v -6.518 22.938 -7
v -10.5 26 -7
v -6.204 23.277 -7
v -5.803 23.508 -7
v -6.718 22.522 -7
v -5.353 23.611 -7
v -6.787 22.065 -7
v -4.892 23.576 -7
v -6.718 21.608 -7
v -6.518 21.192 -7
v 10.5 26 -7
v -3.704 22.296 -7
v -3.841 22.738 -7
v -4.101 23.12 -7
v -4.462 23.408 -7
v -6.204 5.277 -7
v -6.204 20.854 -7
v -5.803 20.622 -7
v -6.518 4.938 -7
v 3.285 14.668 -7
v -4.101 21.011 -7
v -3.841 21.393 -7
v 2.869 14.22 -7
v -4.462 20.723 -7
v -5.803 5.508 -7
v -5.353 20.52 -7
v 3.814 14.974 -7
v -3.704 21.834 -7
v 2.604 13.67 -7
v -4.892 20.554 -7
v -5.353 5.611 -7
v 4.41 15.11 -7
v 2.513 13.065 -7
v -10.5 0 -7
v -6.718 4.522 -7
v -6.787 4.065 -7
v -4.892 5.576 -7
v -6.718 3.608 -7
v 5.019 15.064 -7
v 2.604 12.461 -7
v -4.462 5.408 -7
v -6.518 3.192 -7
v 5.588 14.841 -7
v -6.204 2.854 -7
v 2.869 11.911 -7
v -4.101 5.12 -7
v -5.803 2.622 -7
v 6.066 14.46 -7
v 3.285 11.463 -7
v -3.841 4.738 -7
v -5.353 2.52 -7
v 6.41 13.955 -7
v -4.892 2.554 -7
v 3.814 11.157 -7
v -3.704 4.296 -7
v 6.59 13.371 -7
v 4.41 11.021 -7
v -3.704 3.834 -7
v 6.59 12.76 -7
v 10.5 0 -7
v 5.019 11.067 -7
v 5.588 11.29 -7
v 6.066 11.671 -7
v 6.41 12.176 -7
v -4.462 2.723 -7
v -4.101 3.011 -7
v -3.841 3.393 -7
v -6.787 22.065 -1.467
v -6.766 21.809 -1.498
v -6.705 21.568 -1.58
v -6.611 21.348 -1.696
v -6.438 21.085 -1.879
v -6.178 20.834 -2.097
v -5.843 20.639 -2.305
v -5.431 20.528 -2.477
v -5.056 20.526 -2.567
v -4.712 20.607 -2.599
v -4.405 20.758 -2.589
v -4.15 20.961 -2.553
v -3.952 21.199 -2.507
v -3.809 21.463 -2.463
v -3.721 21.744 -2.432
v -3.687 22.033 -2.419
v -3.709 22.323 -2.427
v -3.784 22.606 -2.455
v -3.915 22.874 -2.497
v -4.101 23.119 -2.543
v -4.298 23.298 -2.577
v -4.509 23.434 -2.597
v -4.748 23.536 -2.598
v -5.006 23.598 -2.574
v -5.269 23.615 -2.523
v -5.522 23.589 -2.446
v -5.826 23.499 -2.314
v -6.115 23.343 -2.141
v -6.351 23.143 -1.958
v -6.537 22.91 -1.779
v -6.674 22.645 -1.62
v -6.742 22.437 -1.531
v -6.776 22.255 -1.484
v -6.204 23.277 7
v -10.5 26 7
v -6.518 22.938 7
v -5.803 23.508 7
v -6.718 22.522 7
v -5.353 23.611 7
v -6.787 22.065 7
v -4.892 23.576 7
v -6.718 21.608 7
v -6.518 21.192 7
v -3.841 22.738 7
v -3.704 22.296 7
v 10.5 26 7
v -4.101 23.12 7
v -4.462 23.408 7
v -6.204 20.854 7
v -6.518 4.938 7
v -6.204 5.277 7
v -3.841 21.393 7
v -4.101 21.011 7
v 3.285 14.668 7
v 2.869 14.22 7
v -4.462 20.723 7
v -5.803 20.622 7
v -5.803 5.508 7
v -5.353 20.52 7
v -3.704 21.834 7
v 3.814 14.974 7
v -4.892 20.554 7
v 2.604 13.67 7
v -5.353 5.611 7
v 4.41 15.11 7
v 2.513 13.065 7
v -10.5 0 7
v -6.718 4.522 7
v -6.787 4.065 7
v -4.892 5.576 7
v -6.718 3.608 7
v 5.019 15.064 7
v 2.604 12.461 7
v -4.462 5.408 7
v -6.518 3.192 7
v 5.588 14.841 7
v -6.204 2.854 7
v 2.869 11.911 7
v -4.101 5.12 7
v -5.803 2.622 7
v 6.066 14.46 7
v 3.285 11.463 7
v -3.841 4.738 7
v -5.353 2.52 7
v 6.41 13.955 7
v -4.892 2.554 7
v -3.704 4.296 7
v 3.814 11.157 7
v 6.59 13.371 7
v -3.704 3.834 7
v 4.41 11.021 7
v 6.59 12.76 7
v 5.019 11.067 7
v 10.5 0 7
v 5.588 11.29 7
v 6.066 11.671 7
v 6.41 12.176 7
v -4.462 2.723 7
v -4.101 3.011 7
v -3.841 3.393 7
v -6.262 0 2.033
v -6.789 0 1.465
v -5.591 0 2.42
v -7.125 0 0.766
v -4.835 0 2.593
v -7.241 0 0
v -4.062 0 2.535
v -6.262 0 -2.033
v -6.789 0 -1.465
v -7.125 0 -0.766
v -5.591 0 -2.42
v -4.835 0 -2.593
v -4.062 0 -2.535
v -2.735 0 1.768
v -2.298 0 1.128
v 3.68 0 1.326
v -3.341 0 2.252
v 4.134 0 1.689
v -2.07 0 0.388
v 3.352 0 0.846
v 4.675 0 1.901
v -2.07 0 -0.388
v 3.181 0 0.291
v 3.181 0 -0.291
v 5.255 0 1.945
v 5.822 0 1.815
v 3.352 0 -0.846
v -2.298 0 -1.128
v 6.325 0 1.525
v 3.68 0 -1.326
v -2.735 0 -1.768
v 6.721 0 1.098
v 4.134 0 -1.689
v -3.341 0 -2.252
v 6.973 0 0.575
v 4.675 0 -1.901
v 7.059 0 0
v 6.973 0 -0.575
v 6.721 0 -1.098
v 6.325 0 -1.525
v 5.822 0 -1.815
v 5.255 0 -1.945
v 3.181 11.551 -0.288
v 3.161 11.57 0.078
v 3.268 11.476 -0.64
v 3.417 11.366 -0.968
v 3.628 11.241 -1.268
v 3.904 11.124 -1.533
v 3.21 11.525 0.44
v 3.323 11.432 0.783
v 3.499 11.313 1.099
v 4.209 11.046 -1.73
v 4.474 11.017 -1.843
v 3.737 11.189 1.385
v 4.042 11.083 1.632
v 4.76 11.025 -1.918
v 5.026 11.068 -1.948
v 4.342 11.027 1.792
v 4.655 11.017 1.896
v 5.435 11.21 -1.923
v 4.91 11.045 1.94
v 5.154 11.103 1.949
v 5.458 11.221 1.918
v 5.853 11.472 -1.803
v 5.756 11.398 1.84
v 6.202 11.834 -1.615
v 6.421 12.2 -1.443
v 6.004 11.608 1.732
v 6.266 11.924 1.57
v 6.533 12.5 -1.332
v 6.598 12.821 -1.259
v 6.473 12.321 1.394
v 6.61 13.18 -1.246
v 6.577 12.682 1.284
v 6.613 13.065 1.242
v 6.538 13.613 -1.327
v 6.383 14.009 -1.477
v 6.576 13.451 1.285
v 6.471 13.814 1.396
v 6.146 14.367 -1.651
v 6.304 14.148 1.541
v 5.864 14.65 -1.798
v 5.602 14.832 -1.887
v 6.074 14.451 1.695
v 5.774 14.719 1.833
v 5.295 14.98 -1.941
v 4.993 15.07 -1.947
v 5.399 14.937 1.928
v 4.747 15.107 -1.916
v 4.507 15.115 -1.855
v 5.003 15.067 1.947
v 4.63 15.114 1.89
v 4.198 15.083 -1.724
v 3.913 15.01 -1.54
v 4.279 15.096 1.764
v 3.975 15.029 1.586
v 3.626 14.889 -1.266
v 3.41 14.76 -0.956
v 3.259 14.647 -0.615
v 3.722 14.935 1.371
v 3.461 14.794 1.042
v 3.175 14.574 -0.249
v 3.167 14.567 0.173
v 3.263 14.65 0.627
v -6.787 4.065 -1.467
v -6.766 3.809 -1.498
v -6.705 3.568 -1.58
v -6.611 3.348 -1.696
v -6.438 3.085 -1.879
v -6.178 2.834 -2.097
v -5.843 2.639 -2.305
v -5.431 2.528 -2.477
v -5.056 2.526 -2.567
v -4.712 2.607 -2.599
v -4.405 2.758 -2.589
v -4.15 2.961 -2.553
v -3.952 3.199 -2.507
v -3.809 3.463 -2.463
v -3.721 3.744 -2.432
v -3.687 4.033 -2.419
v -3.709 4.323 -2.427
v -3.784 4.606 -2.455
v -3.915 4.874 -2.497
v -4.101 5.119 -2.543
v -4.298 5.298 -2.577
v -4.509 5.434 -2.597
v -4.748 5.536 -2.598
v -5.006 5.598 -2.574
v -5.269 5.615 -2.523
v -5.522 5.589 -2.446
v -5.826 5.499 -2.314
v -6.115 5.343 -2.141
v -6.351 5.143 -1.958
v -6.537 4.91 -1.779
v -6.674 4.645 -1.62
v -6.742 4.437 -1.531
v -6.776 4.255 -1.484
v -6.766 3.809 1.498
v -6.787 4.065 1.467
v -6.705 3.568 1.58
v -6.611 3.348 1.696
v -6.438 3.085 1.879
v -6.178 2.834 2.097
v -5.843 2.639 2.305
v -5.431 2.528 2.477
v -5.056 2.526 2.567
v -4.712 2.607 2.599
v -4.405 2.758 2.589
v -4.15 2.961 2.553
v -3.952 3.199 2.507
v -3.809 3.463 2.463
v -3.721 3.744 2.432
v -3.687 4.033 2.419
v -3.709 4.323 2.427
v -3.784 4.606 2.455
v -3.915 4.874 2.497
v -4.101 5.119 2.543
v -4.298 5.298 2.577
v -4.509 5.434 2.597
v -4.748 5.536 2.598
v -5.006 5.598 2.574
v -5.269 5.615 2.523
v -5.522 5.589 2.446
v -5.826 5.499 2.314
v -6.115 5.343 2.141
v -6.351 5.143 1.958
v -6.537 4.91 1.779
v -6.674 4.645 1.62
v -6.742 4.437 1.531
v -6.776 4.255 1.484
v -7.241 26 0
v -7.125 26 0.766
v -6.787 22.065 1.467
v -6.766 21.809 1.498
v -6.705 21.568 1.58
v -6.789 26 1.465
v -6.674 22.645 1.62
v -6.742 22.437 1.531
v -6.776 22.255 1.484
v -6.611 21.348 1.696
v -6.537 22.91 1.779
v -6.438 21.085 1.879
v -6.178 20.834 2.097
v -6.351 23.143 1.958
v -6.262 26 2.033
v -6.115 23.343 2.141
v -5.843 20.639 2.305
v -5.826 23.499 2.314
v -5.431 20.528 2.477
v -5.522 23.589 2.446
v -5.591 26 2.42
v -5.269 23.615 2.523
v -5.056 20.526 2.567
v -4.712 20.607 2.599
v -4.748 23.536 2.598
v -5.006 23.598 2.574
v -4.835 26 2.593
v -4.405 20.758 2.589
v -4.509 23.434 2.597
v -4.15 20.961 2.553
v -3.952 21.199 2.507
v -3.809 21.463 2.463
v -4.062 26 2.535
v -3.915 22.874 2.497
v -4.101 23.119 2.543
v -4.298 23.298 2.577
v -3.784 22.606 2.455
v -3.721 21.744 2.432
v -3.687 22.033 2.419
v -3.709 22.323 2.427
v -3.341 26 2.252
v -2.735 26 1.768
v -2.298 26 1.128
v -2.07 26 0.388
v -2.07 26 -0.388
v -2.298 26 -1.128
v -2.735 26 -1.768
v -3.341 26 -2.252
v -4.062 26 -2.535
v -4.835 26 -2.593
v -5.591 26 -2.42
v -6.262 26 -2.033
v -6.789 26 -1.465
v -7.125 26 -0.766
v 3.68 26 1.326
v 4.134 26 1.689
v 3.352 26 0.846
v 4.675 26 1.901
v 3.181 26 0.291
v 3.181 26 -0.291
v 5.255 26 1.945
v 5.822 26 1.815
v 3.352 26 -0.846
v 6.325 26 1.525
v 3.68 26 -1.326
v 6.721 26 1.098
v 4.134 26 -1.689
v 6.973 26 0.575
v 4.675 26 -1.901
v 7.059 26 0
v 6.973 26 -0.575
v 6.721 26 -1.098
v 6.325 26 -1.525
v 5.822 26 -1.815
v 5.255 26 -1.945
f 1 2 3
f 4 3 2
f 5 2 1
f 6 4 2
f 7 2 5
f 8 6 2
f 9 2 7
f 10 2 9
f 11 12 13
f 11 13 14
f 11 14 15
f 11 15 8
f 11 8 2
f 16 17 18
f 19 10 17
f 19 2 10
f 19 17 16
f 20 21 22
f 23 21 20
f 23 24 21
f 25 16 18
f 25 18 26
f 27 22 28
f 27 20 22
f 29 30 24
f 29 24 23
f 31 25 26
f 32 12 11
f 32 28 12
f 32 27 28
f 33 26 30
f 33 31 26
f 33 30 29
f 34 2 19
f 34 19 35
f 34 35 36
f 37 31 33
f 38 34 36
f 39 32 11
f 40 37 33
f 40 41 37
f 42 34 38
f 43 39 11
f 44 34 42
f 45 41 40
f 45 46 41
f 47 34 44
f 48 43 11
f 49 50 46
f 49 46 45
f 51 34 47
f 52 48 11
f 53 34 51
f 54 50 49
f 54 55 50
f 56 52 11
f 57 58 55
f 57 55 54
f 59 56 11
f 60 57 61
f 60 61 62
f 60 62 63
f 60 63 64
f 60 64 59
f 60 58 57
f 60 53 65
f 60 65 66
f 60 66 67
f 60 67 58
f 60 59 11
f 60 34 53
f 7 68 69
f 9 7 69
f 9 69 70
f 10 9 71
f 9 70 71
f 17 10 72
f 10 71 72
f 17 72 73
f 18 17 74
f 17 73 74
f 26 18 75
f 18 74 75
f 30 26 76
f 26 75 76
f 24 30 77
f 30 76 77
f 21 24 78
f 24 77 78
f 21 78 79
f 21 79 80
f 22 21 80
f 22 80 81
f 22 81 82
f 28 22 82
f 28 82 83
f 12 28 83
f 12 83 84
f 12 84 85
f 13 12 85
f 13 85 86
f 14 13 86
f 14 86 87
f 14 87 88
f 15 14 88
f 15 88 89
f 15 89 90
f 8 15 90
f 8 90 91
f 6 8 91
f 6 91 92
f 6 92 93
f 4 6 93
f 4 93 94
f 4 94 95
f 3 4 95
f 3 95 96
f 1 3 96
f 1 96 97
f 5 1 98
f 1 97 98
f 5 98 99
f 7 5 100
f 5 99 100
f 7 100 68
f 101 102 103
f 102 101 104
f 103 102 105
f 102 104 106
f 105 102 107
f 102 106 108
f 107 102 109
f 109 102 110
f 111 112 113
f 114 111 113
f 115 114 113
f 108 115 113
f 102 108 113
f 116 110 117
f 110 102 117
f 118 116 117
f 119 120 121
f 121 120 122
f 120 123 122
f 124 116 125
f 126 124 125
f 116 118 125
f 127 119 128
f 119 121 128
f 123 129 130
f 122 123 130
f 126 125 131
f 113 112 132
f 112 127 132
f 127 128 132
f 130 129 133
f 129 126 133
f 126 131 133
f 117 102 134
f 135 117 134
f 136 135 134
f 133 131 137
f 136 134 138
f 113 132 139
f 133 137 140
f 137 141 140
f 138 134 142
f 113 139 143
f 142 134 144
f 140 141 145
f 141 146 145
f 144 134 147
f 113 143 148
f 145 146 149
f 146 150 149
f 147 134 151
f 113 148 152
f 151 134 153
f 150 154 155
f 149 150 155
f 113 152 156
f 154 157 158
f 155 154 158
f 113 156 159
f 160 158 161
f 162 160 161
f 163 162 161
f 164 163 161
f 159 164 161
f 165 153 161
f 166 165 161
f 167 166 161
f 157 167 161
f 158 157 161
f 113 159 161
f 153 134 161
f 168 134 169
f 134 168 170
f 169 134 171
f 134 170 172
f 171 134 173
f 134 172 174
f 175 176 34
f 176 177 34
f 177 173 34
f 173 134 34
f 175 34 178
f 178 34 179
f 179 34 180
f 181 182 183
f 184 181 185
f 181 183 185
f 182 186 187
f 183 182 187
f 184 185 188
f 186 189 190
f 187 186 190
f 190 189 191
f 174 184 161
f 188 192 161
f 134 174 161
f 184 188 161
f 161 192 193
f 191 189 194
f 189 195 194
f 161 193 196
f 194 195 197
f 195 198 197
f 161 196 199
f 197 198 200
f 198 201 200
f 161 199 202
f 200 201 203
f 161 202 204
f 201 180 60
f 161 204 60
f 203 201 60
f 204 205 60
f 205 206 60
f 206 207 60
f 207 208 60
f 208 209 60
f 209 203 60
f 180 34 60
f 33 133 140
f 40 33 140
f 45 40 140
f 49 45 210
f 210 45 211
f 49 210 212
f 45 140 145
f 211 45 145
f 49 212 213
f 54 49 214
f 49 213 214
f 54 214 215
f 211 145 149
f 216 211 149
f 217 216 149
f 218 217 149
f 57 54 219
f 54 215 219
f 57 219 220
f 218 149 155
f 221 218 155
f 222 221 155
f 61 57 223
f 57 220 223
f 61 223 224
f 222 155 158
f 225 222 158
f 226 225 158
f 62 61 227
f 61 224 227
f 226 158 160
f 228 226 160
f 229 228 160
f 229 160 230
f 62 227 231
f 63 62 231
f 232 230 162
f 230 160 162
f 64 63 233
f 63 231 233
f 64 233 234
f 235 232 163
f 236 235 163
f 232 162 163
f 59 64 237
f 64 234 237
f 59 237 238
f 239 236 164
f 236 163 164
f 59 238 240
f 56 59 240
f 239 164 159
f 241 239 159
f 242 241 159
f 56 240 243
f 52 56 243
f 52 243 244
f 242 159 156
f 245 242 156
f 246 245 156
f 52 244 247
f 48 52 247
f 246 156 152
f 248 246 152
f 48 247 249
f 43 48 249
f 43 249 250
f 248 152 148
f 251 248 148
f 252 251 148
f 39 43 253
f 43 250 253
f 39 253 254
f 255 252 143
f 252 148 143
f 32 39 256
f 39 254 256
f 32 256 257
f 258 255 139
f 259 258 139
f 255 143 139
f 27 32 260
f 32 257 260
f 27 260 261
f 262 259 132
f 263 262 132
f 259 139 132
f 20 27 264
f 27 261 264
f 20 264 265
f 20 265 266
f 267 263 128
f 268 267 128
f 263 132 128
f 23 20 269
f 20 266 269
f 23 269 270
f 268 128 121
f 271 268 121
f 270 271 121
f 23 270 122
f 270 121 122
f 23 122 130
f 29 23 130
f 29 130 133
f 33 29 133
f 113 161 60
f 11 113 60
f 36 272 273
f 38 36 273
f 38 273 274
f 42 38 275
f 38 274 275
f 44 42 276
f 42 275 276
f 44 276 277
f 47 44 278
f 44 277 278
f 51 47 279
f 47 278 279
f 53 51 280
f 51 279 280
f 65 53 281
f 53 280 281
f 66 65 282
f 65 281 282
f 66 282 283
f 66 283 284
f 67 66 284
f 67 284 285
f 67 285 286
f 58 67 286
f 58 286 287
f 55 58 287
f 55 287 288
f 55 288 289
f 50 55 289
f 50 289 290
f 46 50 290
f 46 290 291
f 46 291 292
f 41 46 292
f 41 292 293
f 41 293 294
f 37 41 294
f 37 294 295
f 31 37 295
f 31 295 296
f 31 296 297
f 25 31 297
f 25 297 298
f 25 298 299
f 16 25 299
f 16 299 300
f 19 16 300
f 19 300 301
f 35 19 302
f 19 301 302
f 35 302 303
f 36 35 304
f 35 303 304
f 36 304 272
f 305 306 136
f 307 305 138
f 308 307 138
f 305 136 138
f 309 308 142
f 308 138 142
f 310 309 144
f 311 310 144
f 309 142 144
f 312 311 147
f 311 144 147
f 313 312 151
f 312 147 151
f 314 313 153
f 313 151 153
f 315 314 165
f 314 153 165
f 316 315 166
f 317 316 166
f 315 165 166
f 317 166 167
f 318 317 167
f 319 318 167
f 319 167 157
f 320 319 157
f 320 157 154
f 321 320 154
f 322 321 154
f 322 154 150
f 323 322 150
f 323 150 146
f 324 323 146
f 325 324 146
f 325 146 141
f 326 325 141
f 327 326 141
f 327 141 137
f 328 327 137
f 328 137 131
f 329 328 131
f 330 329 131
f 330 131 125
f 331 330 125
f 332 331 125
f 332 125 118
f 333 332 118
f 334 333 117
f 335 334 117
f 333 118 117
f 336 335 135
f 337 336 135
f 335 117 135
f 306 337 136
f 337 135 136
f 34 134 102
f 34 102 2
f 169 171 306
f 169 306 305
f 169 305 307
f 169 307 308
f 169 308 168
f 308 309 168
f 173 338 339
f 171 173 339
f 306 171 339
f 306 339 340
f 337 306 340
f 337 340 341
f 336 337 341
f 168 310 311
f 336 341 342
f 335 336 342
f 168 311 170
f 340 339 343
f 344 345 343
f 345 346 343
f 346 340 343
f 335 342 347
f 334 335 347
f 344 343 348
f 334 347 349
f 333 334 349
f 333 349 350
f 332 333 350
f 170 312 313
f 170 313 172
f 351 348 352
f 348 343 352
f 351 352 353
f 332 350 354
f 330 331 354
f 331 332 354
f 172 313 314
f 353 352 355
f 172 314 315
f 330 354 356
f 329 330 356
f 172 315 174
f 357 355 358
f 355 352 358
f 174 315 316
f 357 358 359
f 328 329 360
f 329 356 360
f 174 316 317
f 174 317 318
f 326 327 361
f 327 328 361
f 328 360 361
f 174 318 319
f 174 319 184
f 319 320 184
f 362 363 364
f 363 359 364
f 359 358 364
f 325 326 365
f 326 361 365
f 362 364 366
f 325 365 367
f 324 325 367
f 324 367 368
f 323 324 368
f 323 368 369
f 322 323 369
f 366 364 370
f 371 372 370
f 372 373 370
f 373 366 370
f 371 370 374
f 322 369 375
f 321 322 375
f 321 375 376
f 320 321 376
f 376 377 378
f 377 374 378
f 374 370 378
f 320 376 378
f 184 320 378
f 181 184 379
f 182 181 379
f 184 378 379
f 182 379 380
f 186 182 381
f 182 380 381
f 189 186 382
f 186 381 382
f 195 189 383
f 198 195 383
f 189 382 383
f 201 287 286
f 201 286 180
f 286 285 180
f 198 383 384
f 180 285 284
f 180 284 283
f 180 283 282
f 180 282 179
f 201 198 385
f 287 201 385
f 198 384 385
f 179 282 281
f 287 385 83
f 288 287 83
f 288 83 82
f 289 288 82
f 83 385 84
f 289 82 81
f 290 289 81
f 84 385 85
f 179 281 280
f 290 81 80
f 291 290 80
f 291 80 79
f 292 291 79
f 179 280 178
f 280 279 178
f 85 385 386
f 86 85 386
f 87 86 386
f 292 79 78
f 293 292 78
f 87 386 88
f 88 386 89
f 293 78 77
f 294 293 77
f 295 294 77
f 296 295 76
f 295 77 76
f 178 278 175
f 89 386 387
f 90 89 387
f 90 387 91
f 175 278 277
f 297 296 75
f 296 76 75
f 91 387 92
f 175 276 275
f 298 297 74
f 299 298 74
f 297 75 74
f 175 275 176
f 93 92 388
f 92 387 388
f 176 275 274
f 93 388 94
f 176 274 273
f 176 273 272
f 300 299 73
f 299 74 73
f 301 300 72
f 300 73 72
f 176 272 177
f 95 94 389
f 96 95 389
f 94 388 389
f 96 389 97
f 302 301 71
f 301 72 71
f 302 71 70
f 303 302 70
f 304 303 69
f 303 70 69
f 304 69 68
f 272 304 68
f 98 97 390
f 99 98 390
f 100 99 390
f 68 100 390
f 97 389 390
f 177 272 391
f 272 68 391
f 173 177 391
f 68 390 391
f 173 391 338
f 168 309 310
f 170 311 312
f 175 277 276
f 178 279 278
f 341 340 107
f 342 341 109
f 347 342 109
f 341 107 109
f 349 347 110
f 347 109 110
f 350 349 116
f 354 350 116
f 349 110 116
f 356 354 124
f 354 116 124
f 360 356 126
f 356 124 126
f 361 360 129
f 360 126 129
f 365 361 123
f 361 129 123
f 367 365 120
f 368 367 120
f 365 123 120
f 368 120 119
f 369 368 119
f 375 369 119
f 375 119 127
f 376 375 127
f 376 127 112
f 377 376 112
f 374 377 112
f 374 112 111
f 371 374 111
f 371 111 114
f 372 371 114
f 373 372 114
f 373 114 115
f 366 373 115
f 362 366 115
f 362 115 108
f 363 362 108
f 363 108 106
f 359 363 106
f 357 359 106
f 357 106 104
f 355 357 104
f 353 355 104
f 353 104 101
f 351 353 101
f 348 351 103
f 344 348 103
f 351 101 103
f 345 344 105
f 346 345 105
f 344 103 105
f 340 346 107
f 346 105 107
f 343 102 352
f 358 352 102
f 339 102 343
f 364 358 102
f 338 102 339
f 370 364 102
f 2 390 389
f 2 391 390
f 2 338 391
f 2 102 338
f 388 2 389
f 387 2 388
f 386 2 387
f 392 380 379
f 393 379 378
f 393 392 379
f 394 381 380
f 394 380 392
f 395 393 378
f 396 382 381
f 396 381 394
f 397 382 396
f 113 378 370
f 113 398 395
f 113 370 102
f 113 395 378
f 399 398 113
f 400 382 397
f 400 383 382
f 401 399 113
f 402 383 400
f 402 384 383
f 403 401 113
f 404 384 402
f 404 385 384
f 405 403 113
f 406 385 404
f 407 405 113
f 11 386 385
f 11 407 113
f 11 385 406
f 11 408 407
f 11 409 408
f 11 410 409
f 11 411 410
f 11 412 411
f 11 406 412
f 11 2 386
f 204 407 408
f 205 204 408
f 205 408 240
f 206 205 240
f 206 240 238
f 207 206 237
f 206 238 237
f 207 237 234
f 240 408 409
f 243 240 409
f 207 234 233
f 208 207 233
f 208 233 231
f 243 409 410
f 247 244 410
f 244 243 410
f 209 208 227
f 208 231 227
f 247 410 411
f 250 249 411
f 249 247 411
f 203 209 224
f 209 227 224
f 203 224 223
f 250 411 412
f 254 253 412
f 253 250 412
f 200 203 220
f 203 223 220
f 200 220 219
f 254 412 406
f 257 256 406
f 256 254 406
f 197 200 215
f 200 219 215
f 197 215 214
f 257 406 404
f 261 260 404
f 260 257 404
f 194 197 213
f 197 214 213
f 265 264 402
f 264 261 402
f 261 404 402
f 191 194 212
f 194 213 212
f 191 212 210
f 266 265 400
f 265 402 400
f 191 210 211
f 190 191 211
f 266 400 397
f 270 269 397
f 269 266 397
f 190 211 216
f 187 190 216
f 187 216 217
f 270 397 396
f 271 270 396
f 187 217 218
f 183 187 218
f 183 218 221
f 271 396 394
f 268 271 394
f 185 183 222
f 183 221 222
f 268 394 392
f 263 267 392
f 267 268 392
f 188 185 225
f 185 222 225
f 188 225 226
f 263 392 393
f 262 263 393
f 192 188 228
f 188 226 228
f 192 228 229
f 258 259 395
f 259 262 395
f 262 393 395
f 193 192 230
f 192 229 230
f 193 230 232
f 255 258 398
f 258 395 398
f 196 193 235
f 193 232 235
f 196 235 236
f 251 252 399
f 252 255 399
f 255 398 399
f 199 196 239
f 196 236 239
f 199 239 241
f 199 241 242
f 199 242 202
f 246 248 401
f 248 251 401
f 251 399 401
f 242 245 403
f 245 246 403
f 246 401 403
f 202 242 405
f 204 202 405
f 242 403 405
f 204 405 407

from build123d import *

# Parameters (mm, degrees)
SKETCH1_W           = 21
SKETCH1_H           = 14
BOSS_EXTRUDE2_DEPTH = 26
CUT_EXTRUDE1_DEPTH  = 26
CUT_EXTRUDE2_DEPTH  = 26


with BuildPart() as part:
    # Sketch1 → Boss-Extrude2 (new body)
    with BuildSketch(Plane(origin=(0, 0, 0), x_dir=(1, 0, 0), z_dir=(0, 1, 0))):
        Rectangle(SKETCH1_W, SKETCH1_H)
    extrude(amount=BOSS_EXTRUDE2_DEPTH)

    # Sketch3 → Cut-Extrude1 (cut)
    with BuildSketch(Plane.XY.offset(7)):
        with BuildLine():
            ThreePointArc((-3.687132732, 4.065349549), (-5.237132732, 5.615349549), (-6.787132732, 4.065349549))
            ThreePointArc((-6.787132732, 4.065349549), (-5.237132732, 2.515349549), (-3.687132732, 4.065349549))
        make_face()
        with BuildLine():
            ThreePointArc((6.612867268, 13.065349549), (4.562867268, 15.115349549), (2.512867268, 13.065349549))
            ThreePointArc((2.512867268, 13.065349549), (4.562867268, 11.015349549), (6.612867268, 13.065349549))
        make_face()
        with BuildLine():
            ThreePointArc((-3.687132732, 22.065349549), (-5.237132732, 23.615349549), (-6.787132732, 22.065349549))
            ThreePointArc((-6.787132732, 22.065349549), (-5.237132732, 20.515349549), (-3.687132732, 22.065349549))
        make_face()
    extrude(amount=-CUT_EXTRUDE1_DEPTH, mode=Mode.SUBTRACT)

    # Sketch4 → Cut-Extrude2 (cut)
    with BuildSketch(Plane(origin=(0, 26, 0), x_dir=(1, 0, 0), z_dir=(0, 1, 0))):
        with BuildLine():
            ThreePointArc((-2.040636321, 0), (-4.640636321, 2.6), (-7.240636321, 0))
            ThreePointArc((-7.240636321, 0), (-4.640636321, -2.6), (-2.040636321, 0))
        make_face()
        with BuildLine():
            ThreePointArc((3.159363679, 0), (5.109363679, -1.95), (7.059363679, 0))
            ThreePointArc((7.059363679, 0), (5.109363679, 1.95), (3.159363679, 0))
        make_face()
    extrude(amount=-CUT_EXTRUDE2_DEPTH, mode=Mode.SUBTRACT)


solid = part.part
